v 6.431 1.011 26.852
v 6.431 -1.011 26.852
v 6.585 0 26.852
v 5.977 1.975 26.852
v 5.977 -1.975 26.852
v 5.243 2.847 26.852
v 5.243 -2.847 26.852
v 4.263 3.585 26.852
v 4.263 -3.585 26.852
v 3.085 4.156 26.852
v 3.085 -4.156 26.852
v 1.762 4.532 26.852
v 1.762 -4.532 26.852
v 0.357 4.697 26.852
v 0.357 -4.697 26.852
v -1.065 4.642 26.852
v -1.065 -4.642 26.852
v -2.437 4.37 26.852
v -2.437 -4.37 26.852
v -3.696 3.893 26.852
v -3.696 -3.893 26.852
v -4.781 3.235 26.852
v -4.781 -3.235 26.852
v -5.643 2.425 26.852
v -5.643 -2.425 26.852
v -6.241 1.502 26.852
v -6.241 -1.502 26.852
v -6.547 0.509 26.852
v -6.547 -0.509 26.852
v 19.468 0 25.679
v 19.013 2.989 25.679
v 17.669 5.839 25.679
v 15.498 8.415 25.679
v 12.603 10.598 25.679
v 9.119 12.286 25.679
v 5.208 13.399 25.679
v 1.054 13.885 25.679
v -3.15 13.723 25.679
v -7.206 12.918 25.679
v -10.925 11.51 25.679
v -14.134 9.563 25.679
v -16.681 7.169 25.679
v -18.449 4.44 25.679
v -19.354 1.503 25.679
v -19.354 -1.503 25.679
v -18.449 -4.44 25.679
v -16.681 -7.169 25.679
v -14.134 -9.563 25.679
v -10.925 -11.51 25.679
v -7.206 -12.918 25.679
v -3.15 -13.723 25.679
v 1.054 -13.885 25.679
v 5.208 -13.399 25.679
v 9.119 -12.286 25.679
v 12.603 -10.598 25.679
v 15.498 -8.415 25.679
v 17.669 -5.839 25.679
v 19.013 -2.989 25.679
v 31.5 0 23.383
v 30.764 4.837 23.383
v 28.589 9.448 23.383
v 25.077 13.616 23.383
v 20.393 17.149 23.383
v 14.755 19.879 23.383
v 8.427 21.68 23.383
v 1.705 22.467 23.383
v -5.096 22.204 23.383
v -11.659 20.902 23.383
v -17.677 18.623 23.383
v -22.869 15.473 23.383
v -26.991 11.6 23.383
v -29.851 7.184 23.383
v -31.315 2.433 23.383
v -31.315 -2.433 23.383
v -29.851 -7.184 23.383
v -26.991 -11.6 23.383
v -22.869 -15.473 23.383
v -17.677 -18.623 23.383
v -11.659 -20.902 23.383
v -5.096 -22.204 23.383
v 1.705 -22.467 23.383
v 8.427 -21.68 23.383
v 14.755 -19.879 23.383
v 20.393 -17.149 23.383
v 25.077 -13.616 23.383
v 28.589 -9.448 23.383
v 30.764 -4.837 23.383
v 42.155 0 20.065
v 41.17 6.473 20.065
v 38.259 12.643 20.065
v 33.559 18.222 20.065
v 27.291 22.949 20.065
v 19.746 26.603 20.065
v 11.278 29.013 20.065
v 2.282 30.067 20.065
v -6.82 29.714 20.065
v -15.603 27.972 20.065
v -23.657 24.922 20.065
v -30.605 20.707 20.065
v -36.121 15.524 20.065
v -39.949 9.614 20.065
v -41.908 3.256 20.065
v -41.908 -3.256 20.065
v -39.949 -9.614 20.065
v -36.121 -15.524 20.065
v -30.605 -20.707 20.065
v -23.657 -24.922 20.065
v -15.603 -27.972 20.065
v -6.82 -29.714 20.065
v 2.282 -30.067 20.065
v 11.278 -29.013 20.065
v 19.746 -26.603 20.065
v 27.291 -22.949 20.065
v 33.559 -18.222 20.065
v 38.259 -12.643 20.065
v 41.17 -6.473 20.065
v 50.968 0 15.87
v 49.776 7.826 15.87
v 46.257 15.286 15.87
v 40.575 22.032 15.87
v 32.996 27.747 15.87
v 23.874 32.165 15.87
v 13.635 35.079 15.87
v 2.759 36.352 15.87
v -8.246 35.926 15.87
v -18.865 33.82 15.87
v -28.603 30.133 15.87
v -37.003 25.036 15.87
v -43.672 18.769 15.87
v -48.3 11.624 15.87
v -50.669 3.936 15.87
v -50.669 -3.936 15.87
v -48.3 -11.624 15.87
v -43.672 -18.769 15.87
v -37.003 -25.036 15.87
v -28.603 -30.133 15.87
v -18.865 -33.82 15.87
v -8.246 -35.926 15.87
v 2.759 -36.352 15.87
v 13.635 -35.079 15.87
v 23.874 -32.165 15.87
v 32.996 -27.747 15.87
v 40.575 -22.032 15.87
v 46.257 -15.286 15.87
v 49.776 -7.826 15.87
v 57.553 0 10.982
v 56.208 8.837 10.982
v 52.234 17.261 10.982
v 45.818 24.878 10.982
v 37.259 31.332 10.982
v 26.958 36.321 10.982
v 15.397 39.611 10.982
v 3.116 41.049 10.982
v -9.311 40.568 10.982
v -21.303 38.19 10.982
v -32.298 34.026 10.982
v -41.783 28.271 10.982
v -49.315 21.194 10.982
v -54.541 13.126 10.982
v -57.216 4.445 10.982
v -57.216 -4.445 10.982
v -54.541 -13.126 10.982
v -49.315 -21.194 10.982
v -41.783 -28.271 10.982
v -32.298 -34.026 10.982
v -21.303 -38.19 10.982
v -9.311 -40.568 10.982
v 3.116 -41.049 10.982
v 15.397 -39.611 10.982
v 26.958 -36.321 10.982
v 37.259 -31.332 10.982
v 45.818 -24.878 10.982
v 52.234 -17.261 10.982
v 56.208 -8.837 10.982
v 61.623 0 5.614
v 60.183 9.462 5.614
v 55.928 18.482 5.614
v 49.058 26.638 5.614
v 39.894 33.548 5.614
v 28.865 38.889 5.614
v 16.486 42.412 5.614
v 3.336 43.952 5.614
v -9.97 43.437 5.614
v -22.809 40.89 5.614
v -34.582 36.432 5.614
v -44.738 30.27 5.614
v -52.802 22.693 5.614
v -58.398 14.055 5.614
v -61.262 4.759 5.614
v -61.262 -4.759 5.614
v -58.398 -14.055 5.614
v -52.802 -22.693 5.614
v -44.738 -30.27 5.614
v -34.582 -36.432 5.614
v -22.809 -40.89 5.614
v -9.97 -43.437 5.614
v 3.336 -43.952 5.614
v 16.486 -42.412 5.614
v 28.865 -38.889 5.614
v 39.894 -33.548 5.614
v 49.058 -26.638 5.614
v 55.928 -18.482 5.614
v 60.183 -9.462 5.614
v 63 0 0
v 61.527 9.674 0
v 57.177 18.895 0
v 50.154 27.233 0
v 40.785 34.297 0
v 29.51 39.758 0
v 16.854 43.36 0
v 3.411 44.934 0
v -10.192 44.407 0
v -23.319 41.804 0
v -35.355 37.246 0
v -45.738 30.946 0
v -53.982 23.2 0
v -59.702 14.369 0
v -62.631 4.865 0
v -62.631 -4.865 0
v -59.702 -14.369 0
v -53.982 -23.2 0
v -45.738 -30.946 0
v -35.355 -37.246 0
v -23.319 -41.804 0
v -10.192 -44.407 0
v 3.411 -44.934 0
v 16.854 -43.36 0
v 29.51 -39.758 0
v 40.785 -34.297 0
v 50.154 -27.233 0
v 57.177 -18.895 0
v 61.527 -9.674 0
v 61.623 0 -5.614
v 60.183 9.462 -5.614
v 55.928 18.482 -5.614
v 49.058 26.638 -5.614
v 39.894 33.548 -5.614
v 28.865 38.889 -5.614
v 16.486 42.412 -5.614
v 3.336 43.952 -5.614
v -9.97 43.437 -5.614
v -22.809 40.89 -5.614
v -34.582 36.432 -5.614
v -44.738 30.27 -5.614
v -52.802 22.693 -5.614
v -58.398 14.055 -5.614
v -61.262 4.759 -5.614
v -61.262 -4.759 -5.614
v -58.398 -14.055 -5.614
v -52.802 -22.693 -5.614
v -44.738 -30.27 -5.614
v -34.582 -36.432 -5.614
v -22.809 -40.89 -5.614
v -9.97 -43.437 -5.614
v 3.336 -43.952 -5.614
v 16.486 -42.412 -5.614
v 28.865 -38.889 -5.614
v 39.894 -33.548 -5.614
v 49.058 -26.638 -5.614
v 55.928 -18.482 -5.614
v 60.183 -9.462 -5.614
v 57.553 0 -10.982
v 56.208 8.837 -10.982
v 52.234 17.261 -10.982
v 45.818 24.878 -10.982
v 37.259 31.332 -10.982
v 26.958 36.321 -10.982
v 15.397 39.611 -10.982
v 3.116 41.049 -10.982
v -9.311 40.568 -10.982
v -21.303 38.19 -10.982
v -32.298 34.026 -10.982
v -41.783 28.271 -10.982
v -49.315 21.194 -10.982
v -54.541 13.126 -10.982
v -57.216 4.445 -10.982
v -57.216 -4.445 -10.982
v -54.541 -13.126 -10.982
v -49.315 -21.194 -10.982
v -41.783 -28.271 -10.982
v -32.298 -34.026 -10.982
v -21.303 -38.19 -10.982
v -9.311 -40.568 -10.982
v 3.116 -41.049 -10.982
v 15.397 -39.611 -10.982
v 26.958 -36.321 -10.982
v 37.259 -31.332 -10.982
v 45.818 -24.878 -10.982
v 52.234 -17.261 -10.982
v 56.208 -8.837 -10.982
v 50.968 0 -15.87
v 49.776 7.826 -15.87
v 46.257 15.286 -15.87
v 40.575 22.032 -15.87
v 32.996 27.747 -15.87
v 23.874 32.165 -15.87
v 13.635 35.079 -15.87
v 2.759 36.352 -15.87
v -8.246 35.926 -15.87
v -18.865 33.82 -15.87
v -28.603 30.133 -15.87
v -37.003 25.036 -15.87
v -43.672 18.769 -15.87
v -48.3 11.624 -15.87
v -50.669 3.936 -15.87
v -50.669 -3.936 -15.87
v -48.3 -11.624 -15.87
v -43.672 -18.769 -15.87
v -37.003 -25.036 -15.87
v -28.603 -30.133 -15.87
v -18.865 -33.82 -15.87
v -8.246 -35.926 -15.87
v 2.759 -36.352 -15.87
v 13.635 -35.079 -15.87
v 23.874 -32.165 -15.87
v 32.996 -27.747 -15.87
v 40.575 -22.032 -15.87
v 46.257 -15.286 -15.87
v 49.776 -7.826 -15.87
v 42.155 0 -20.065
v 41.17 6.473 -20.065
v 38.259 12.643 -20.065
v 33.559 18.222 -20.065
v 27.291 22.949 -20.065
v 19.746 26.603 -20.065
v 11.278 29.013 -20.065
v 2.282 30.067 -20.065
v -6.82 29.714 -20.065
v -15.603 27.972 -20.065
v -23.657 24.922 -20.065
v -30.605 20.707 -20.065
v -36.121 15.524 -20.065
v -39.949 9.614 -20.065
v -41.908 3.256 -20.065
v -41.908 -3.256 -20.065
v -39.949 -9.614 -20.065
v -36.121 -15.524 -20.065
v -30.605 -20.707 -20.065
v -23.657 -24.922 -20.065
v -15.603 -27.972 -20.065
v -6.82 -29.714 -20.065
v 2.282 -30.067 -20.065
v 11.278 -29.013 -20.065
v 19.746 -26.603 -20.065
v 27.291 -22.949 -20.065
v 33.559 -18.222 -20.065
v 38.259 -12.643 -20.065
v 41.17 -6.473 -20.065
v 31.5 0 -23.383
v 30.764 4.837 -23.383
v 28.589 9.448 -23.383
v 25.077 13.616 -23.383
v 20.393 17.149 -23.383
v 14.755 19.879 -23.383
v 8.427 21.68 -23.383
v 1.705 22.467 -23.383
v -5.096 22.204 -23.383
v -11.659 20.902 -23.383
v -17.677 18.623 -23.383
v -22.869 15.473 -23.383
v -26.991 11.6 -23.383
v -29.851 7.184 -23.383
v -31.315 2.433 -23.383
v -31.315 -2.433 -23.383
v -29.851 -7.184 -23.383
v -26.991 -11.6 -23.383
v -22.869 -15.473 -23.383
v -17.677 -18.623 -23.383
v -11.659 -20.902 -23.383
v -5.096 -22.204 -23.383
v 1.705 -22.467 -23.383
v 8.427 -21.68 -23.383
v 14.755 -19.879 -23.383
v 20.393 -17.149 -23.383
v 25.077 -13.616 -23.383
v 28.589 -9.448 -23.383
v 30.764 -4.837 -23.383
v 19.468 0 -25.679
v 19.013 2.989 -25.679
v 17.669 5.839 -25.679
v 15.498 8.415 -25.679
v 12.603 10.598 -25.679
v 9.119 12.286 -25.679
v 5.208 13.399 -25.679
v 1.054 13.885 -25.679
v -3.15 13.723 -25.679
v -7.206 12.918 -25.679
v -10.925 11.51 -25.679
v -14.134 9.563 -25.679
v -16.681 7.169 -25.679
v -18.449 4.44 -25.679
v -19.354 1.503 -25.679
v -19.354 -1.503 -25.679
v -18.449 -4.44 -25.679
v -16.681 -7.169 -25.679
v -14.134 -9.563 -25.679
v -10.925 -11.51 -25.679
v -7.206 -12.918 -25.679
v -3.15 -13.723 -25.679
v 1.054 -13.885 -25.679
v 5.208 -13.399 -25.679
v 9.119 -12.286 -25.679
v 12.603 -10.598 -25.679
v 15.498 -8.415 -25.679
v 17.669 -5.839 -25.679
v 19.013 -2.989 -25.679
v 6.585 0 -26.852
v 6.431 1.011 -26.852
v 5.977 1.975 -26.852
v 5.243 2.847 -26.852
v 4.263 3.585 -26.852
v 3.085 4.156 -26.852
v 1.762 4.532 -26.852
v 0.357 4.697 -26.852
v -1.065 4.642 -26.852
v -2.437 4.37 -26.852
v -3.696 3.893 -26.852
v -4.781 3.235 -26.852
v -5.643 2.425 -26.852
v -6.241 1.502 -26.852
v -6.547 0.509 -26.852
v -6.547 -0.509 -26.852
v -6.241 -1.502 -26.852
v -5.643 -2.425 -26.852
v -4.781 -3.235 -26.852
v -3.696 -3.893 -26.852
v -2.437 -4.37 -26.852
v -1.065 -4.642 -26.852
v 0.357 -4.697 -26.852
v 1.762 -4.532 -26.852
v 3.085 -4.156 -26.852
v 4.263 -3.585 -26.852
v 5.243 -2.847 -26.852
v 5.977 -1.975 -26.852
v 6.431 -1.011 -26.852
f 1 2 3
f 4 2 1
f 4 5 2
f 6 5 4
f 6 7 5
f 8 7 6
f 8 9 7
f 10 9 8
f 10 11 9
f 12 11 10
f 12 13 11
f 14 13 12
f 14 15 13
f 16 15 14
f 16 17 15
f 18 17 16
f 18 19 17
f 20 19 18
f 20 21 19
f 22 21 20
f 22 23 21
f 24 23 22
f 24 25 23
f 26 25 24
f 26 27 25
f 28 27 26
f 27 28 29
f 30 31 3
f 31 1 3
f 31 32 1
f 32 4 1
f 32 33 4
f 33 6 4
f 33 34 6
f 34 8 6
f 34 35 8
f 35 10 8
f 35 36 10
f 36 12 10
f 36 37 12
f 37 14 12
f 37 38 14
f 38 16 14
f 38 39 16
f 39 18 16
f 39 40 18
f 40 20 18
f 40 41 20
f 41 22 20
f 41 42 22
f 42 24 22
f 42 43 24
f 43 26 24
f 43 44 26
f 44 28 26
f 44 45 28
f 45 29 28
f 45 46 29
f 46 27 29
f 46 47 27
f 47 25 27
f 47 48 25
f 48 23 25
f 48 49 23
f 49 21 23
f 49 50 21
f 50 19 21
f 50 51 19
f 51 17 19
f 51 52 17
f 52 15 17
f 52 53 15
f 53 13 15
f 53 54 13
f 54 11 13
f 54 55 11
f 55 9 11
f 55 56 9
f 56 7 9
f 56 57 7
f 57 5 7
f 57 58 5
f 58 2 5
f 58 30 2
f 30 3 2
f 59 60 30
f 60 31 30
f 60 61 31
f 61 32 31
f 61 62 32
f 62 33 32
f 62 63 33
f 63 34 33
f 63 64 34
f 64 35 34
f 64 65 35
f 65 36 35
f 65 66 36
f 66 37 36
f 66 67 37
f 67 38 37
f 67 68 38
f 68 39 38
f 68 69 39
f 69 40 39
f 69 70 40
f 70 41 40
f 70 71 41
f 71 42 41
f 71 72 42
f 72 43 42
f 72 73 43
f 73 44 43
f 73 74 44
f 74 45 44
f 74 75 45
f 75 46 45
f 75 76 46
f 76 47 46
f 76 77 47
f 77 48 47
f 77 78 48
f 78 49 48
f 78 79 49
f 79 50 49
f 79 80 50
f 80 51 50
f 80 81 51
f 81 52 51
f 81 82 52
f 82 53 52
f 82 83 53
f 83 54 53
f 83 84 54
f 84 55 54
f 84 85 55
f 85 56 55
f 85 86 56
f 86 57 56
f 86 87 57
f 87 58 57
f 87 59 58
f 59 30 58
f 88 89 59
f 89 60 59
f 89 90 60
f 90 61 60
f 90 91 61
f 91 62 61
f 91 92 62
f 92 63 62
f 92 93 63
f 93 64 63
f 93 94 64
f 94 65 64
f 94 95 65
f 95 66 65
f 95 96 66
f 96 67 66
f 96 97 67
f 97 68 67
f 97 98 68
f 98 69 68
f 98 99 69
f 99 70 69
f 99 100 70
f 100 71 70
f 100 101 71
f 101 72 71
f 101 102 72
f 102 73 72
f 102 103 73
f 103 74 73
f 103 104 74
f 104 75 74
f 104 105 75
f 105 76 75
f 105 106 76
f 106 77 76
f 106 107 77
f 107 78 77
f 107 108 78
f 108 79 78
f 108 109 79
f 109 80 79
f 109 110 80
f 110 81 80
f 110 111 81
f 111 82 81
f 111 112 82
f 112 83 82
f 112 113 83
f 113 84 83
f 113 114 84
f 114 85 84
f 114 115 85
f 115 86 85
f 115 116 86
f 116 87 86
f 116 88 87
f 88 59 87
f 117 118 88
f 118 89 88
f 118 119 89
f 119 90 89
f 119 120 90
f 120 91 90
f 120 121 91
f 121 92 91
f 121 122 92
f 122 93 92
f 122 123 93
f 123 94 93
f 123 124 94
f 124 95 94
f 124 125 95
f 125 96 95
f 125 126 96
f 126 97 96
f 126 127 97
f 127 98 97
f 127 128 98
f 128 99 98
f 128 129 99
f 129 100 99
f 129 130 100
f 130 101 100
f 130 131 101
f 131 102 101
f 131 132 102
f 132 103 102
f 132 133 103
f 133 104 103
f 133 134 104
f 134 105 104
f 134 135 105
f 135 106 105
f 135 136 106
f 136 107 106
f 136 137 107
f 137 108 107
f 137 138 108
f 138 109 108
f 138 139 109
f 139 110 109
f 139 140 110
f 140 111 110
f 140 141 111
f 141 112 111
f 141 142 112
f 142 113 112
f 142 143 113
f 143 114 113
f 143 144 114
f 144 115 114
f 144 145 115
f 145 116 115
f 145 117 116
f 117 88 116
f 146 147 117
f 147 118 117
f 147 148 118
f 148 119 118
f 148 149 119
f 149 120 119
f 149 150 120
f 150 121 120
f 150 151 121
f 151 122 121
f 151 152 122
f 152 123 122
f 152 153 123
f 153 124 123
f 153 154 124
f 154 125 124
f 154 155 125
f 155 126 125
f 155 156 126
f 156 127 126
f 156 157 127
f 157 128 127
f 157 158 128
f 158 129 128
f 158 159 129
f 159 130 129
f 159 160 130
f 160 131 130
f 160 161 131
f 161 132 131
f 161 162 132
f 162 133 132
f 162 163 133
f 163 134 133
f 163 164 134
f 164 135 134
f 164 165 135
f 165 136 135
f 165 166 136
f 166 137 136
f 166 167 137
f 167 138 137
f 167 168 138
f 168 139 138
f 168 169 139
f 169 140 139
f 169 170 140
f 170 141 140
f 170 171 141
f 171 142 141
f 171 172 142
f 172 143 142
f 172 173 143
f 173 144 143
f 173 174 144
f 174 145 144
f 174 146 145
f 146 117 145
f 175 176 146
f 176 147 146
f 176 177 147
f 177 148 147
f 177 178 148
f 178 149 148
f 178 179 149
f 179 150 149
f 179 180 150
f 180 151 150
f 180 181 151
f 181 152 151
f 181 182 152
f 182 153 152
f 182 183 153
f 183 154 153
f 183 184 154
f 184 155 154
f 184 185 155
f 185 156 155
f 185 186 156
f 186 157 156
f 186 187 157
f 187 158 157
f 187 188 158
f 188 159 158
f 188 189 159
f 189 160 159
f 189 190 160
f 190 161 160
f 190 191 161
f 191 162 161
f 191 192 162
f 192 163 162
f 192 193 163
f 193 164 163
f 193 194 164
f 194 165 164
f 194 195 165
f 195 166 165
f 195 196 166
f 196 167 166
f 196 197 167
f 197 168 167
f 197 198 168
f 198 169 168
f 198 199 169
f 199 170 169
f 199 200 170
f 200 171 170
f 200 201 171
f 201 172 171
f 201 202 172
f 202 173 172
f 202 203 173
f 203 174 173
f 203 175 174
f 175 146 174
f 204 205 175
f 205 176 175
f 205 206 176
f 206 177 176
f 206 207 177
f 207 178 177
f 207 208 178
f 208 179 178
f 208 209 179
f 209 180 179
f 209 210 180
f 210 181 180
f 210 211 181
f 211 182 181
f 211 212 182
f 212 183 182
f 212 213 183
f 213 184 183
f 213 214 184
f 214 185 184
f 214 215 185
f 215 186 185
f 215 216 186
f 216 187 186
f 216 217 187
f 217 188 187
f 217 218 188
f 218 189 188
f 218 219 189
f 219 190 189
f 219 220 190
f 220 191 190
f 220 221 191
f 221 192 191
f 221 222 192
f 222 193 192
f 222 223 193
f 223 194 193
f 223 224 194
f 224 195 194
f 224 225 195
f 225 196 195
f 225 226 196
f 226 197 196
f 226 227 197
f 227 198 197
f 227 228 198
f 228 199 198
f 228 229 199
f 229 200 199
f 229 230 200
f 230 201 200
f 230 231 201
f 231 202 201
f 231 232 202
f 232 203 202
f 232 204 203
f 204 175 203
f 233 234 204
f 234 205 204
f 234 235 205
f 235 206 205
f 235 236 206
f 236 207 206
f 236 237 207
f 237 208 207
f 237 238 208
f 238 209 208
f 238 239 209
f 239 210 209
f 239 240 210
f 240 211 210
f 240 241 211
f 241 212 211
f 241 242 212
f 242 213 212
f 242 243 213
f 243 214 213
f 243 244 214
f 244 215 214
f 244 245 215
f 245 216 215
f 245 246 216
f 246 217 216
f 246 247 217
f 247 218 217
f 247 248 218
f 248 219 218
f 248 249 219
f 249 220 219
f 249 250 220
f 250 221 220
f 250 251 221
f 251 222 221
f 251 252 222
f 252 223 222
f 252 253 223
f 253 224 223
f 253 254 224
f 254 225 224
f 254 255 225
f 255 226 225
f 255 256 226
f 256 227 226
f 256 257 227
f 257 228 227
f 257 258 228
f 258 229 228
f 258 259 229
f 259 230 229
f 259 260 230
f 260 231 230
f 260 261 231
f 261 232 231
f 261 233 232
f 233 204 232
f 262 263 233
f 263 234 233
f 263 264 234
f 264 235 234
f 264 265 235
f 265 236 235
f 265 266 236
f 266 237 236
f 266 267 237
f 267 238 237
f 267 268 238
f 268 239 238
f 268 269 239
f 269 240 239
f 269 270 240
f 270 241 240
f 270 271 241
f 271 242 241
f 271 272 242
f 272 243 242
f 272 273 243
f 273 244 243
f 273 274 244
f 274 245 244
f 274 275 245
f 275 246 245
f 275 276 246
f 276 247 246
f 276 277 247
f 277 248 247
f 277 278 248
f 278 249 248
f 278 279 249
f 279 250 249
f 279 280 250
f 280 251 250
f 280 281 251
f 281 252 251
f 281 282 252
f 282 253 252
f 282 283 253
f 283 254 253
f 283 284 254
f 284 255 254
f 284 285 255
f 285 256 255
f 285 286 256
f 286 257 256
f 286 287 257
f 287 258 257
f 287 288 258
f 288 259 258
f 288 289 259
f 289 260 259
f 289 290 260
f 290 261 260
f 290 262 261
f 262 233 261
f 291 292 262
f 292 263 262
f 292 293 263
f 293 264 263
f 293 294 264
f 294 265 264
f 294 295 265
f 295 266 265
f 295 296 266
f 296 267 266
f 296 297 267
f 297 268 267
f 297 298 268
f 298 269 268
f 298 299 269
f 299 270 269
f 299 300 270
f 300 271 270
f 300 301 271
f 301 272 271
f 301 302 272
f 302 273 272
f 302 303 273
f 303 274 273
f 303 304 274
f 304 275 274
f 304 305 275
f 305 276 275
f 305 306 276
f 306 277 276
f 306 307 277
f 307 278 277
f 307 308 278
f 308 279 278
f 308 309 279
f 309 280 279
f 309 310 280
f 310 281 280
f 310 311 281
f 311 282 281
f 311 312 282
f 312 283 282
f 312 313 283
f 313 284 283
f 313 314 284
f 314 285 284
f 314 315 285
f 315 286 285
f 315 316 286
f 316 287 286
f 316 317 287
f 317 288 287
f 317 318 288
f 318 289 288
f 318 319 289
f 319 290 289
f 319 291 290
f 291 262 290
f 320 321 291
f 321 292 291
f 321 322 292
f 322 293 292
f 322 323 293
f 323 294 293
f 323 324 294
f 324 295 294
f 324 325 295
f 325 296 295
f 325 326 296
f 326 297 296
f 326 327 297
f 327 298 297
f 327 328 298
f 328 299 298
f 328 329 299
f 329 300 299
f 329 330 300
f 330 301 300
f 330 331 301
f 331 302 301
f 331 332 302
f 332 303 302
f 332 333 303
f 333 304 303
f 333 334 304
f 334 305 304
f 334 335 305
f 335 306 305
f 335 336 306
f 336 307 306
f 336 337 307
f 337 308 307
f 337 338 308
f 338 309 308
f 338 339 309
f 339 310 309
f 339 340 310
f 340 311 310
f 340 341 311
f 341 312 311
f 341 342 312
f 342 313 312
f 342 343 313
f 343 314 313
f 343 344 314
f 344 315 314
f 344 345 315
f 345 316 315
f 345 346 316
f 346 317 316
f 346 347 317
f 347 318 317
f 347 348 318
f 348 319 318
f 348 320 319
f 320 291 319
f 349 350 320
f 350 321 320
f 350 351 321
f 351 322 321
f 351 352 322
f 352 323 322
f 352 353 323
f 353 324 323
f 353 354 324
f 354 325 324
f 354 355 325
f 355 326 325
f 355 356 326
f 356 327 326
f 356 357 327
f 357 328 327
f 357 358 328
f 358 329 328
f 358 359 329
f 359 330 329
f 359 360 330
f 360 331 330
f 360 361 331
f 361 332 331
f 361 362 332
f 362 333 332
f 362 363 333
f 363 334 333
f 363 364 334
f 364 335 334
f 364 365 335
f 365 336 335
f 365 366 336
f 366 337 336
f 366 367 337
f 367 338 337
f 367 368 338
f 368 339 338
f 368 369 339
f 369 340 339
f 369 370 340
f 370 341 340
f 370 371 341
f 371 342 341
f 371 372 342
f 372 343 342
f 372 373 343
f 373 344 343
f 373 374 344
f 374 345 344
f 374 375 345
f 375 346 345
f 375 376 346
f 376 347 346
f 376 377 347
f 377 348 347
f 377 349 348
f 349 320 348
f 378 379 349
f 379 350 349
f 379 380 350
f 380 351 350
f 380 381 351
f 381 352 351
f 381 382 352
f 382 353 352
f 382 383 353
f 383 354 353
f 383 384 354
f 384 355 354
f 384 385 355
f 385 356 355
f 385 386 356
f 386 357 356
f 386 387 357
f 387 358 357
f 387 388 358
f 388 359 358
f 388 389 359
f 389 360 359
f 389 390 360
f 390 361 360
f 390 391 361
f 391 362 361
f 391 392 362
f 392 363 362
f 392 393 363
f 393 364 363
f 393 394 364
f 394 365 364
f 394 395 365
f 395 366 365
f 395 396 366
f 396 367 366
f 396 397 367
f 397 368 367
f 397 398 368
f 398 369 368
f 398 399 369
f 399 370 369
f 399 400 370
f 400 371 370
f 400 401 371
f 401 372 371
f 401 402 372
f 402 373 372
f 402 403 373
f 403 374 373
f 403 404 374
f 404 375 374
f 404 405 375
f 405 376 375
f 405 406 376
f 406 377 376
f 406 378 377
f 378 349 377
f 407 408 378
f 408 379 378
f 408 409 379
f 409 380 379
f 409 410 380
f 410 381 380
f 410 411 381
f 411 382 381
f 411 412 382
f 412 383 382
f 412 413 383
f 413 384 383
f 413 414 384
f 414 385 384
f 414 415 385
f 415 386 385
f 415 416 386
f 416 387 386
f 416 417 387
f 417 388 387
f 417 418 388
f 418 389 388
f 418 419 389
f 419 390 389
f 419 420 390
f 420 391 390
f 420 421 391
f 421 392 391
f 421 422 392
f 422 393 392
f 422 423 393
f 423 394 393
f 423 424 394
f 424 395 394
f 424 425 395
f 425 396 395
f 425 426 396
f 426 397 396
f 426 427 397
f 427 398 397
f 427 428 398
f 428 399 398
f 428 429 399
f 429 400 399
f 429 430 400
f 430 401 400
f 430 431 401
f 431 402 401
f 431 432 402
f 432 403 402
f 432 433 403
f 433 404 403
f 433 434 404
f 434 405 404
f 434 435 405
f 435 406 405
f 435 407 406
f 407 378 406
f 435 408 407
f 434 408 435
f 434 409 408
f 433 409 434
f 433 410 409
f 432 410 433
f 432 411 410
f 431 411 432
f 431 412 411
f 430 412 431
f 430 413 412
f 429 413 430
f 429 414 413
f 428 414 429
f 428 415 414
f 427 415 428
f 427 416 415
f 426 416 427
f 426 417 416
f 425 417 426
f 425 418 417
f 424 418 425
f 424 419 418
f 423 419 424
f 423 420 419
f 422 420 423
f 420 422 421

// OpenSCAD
// Generated by SolidPython 1.0.1 on 2020-07-29 00:46:47


scale(v = [7, 5, 3]) {
	sphere(r = 9);
}
/***********************************************
*********      SolidPython code:      **********
************************************************
 
# import packages: SolidPython
from solid import *
from solid.utils import *
from itertools import chain, combinations, permutations


class Resize:

    def __init__(self, scad_file):
        self.scad_file = scad_file
        #self.scad_file = import_scad(scad_file)
        # cone/cylinder param:
        self.r1 = 0
        self.r2 = 0
        self.h = 0
        # rectangular prism param:
        self.w = 0
        self.l = 0
        # ellipse param:
        self.r = 0

    # import OpenScad code (file name corresponds to shape)


    # classify shape + parameters
    def assign(self, param1, param2, param3):
        if self.scad_file == 'cone.scad':
            self.r1 = param1
            self.r2 = param2
            self.h = param3
        elif self.scad_file == 'cylinder.scad':
            self.r1 = param1
            self.r2 = param2
            self.h = param3
        elif self.scad_file == 'rectangularPrism.scad':
            self.h = param1
            self.l = param2
            self.w = param3
        else:
            self.r = param1
            self.h = param2

    # resize parameters
    def iterate(self):
        x = range(3, 20, 2)
        i = 1
        if self.scad_file == 'cone.scad':
            tempList = list(permutations(x, 2))
            for temp in tempList:
                param1 = temp[0]
                param2 = temp[1]
                filepath = 'produced_scad_files/' + 'cone' + str(param1) + '_' + str(param2) + '_' + '.scad'
                scad_render_to_file(cylinder(h=param1, r1=param2, r2=0), filepath)

        elif self.scad_file == 'cylinder.scad':
            tempList = list(permutations(x, 3))
            for temp in tempList:
                param1 = temp[0]
                param2 = temp[1]
                filepath = 'produced_scad_files/' + 'cylinder' + str(param1) + '_' + str(param2) + '_' + '.scad'
                scad_render_to_file(cylinder(h=param1, r1=param2, r2=param2), filepath)

        elif self.scad_file == 'rectangularPrism.scad':
            tempList = list(permutations(x, 3))
            for temp in tempList:
                param1 = temp[0]
                param2 = temp[1]
                param3 = temp[2]
                filepath = 'produced_scad_files/' + 'rectangularPrism' + str(param1) + '_' + str(param2) + '_' + str(
                    param3) + '.scad'
                scad_render_to_file(cube(size=(param1, param2, param3)), filepath)

        elif self.scad_file == 'ellipse.scad':
            tempList = list(permutations(x, 4))
            for temp in tempList:
                param1 = temp[0]
                param2 = temp[1]
                param3 = temp[2]
                param4 = temp[3]
                filepath = 'produced_scad_files/' + 'ellipse' + str(param1) + '_' + str(param2) + '_' + str(param3) + '_' + str(param4) + '.scad'
                scad_render_to_file(scale([param1, param2, param3])(sphere(r=param4)), filepath)

    def render_to_scadfile(self):
        scad_render_to_file(scad, 'example.scad') 
 
************************************************/
